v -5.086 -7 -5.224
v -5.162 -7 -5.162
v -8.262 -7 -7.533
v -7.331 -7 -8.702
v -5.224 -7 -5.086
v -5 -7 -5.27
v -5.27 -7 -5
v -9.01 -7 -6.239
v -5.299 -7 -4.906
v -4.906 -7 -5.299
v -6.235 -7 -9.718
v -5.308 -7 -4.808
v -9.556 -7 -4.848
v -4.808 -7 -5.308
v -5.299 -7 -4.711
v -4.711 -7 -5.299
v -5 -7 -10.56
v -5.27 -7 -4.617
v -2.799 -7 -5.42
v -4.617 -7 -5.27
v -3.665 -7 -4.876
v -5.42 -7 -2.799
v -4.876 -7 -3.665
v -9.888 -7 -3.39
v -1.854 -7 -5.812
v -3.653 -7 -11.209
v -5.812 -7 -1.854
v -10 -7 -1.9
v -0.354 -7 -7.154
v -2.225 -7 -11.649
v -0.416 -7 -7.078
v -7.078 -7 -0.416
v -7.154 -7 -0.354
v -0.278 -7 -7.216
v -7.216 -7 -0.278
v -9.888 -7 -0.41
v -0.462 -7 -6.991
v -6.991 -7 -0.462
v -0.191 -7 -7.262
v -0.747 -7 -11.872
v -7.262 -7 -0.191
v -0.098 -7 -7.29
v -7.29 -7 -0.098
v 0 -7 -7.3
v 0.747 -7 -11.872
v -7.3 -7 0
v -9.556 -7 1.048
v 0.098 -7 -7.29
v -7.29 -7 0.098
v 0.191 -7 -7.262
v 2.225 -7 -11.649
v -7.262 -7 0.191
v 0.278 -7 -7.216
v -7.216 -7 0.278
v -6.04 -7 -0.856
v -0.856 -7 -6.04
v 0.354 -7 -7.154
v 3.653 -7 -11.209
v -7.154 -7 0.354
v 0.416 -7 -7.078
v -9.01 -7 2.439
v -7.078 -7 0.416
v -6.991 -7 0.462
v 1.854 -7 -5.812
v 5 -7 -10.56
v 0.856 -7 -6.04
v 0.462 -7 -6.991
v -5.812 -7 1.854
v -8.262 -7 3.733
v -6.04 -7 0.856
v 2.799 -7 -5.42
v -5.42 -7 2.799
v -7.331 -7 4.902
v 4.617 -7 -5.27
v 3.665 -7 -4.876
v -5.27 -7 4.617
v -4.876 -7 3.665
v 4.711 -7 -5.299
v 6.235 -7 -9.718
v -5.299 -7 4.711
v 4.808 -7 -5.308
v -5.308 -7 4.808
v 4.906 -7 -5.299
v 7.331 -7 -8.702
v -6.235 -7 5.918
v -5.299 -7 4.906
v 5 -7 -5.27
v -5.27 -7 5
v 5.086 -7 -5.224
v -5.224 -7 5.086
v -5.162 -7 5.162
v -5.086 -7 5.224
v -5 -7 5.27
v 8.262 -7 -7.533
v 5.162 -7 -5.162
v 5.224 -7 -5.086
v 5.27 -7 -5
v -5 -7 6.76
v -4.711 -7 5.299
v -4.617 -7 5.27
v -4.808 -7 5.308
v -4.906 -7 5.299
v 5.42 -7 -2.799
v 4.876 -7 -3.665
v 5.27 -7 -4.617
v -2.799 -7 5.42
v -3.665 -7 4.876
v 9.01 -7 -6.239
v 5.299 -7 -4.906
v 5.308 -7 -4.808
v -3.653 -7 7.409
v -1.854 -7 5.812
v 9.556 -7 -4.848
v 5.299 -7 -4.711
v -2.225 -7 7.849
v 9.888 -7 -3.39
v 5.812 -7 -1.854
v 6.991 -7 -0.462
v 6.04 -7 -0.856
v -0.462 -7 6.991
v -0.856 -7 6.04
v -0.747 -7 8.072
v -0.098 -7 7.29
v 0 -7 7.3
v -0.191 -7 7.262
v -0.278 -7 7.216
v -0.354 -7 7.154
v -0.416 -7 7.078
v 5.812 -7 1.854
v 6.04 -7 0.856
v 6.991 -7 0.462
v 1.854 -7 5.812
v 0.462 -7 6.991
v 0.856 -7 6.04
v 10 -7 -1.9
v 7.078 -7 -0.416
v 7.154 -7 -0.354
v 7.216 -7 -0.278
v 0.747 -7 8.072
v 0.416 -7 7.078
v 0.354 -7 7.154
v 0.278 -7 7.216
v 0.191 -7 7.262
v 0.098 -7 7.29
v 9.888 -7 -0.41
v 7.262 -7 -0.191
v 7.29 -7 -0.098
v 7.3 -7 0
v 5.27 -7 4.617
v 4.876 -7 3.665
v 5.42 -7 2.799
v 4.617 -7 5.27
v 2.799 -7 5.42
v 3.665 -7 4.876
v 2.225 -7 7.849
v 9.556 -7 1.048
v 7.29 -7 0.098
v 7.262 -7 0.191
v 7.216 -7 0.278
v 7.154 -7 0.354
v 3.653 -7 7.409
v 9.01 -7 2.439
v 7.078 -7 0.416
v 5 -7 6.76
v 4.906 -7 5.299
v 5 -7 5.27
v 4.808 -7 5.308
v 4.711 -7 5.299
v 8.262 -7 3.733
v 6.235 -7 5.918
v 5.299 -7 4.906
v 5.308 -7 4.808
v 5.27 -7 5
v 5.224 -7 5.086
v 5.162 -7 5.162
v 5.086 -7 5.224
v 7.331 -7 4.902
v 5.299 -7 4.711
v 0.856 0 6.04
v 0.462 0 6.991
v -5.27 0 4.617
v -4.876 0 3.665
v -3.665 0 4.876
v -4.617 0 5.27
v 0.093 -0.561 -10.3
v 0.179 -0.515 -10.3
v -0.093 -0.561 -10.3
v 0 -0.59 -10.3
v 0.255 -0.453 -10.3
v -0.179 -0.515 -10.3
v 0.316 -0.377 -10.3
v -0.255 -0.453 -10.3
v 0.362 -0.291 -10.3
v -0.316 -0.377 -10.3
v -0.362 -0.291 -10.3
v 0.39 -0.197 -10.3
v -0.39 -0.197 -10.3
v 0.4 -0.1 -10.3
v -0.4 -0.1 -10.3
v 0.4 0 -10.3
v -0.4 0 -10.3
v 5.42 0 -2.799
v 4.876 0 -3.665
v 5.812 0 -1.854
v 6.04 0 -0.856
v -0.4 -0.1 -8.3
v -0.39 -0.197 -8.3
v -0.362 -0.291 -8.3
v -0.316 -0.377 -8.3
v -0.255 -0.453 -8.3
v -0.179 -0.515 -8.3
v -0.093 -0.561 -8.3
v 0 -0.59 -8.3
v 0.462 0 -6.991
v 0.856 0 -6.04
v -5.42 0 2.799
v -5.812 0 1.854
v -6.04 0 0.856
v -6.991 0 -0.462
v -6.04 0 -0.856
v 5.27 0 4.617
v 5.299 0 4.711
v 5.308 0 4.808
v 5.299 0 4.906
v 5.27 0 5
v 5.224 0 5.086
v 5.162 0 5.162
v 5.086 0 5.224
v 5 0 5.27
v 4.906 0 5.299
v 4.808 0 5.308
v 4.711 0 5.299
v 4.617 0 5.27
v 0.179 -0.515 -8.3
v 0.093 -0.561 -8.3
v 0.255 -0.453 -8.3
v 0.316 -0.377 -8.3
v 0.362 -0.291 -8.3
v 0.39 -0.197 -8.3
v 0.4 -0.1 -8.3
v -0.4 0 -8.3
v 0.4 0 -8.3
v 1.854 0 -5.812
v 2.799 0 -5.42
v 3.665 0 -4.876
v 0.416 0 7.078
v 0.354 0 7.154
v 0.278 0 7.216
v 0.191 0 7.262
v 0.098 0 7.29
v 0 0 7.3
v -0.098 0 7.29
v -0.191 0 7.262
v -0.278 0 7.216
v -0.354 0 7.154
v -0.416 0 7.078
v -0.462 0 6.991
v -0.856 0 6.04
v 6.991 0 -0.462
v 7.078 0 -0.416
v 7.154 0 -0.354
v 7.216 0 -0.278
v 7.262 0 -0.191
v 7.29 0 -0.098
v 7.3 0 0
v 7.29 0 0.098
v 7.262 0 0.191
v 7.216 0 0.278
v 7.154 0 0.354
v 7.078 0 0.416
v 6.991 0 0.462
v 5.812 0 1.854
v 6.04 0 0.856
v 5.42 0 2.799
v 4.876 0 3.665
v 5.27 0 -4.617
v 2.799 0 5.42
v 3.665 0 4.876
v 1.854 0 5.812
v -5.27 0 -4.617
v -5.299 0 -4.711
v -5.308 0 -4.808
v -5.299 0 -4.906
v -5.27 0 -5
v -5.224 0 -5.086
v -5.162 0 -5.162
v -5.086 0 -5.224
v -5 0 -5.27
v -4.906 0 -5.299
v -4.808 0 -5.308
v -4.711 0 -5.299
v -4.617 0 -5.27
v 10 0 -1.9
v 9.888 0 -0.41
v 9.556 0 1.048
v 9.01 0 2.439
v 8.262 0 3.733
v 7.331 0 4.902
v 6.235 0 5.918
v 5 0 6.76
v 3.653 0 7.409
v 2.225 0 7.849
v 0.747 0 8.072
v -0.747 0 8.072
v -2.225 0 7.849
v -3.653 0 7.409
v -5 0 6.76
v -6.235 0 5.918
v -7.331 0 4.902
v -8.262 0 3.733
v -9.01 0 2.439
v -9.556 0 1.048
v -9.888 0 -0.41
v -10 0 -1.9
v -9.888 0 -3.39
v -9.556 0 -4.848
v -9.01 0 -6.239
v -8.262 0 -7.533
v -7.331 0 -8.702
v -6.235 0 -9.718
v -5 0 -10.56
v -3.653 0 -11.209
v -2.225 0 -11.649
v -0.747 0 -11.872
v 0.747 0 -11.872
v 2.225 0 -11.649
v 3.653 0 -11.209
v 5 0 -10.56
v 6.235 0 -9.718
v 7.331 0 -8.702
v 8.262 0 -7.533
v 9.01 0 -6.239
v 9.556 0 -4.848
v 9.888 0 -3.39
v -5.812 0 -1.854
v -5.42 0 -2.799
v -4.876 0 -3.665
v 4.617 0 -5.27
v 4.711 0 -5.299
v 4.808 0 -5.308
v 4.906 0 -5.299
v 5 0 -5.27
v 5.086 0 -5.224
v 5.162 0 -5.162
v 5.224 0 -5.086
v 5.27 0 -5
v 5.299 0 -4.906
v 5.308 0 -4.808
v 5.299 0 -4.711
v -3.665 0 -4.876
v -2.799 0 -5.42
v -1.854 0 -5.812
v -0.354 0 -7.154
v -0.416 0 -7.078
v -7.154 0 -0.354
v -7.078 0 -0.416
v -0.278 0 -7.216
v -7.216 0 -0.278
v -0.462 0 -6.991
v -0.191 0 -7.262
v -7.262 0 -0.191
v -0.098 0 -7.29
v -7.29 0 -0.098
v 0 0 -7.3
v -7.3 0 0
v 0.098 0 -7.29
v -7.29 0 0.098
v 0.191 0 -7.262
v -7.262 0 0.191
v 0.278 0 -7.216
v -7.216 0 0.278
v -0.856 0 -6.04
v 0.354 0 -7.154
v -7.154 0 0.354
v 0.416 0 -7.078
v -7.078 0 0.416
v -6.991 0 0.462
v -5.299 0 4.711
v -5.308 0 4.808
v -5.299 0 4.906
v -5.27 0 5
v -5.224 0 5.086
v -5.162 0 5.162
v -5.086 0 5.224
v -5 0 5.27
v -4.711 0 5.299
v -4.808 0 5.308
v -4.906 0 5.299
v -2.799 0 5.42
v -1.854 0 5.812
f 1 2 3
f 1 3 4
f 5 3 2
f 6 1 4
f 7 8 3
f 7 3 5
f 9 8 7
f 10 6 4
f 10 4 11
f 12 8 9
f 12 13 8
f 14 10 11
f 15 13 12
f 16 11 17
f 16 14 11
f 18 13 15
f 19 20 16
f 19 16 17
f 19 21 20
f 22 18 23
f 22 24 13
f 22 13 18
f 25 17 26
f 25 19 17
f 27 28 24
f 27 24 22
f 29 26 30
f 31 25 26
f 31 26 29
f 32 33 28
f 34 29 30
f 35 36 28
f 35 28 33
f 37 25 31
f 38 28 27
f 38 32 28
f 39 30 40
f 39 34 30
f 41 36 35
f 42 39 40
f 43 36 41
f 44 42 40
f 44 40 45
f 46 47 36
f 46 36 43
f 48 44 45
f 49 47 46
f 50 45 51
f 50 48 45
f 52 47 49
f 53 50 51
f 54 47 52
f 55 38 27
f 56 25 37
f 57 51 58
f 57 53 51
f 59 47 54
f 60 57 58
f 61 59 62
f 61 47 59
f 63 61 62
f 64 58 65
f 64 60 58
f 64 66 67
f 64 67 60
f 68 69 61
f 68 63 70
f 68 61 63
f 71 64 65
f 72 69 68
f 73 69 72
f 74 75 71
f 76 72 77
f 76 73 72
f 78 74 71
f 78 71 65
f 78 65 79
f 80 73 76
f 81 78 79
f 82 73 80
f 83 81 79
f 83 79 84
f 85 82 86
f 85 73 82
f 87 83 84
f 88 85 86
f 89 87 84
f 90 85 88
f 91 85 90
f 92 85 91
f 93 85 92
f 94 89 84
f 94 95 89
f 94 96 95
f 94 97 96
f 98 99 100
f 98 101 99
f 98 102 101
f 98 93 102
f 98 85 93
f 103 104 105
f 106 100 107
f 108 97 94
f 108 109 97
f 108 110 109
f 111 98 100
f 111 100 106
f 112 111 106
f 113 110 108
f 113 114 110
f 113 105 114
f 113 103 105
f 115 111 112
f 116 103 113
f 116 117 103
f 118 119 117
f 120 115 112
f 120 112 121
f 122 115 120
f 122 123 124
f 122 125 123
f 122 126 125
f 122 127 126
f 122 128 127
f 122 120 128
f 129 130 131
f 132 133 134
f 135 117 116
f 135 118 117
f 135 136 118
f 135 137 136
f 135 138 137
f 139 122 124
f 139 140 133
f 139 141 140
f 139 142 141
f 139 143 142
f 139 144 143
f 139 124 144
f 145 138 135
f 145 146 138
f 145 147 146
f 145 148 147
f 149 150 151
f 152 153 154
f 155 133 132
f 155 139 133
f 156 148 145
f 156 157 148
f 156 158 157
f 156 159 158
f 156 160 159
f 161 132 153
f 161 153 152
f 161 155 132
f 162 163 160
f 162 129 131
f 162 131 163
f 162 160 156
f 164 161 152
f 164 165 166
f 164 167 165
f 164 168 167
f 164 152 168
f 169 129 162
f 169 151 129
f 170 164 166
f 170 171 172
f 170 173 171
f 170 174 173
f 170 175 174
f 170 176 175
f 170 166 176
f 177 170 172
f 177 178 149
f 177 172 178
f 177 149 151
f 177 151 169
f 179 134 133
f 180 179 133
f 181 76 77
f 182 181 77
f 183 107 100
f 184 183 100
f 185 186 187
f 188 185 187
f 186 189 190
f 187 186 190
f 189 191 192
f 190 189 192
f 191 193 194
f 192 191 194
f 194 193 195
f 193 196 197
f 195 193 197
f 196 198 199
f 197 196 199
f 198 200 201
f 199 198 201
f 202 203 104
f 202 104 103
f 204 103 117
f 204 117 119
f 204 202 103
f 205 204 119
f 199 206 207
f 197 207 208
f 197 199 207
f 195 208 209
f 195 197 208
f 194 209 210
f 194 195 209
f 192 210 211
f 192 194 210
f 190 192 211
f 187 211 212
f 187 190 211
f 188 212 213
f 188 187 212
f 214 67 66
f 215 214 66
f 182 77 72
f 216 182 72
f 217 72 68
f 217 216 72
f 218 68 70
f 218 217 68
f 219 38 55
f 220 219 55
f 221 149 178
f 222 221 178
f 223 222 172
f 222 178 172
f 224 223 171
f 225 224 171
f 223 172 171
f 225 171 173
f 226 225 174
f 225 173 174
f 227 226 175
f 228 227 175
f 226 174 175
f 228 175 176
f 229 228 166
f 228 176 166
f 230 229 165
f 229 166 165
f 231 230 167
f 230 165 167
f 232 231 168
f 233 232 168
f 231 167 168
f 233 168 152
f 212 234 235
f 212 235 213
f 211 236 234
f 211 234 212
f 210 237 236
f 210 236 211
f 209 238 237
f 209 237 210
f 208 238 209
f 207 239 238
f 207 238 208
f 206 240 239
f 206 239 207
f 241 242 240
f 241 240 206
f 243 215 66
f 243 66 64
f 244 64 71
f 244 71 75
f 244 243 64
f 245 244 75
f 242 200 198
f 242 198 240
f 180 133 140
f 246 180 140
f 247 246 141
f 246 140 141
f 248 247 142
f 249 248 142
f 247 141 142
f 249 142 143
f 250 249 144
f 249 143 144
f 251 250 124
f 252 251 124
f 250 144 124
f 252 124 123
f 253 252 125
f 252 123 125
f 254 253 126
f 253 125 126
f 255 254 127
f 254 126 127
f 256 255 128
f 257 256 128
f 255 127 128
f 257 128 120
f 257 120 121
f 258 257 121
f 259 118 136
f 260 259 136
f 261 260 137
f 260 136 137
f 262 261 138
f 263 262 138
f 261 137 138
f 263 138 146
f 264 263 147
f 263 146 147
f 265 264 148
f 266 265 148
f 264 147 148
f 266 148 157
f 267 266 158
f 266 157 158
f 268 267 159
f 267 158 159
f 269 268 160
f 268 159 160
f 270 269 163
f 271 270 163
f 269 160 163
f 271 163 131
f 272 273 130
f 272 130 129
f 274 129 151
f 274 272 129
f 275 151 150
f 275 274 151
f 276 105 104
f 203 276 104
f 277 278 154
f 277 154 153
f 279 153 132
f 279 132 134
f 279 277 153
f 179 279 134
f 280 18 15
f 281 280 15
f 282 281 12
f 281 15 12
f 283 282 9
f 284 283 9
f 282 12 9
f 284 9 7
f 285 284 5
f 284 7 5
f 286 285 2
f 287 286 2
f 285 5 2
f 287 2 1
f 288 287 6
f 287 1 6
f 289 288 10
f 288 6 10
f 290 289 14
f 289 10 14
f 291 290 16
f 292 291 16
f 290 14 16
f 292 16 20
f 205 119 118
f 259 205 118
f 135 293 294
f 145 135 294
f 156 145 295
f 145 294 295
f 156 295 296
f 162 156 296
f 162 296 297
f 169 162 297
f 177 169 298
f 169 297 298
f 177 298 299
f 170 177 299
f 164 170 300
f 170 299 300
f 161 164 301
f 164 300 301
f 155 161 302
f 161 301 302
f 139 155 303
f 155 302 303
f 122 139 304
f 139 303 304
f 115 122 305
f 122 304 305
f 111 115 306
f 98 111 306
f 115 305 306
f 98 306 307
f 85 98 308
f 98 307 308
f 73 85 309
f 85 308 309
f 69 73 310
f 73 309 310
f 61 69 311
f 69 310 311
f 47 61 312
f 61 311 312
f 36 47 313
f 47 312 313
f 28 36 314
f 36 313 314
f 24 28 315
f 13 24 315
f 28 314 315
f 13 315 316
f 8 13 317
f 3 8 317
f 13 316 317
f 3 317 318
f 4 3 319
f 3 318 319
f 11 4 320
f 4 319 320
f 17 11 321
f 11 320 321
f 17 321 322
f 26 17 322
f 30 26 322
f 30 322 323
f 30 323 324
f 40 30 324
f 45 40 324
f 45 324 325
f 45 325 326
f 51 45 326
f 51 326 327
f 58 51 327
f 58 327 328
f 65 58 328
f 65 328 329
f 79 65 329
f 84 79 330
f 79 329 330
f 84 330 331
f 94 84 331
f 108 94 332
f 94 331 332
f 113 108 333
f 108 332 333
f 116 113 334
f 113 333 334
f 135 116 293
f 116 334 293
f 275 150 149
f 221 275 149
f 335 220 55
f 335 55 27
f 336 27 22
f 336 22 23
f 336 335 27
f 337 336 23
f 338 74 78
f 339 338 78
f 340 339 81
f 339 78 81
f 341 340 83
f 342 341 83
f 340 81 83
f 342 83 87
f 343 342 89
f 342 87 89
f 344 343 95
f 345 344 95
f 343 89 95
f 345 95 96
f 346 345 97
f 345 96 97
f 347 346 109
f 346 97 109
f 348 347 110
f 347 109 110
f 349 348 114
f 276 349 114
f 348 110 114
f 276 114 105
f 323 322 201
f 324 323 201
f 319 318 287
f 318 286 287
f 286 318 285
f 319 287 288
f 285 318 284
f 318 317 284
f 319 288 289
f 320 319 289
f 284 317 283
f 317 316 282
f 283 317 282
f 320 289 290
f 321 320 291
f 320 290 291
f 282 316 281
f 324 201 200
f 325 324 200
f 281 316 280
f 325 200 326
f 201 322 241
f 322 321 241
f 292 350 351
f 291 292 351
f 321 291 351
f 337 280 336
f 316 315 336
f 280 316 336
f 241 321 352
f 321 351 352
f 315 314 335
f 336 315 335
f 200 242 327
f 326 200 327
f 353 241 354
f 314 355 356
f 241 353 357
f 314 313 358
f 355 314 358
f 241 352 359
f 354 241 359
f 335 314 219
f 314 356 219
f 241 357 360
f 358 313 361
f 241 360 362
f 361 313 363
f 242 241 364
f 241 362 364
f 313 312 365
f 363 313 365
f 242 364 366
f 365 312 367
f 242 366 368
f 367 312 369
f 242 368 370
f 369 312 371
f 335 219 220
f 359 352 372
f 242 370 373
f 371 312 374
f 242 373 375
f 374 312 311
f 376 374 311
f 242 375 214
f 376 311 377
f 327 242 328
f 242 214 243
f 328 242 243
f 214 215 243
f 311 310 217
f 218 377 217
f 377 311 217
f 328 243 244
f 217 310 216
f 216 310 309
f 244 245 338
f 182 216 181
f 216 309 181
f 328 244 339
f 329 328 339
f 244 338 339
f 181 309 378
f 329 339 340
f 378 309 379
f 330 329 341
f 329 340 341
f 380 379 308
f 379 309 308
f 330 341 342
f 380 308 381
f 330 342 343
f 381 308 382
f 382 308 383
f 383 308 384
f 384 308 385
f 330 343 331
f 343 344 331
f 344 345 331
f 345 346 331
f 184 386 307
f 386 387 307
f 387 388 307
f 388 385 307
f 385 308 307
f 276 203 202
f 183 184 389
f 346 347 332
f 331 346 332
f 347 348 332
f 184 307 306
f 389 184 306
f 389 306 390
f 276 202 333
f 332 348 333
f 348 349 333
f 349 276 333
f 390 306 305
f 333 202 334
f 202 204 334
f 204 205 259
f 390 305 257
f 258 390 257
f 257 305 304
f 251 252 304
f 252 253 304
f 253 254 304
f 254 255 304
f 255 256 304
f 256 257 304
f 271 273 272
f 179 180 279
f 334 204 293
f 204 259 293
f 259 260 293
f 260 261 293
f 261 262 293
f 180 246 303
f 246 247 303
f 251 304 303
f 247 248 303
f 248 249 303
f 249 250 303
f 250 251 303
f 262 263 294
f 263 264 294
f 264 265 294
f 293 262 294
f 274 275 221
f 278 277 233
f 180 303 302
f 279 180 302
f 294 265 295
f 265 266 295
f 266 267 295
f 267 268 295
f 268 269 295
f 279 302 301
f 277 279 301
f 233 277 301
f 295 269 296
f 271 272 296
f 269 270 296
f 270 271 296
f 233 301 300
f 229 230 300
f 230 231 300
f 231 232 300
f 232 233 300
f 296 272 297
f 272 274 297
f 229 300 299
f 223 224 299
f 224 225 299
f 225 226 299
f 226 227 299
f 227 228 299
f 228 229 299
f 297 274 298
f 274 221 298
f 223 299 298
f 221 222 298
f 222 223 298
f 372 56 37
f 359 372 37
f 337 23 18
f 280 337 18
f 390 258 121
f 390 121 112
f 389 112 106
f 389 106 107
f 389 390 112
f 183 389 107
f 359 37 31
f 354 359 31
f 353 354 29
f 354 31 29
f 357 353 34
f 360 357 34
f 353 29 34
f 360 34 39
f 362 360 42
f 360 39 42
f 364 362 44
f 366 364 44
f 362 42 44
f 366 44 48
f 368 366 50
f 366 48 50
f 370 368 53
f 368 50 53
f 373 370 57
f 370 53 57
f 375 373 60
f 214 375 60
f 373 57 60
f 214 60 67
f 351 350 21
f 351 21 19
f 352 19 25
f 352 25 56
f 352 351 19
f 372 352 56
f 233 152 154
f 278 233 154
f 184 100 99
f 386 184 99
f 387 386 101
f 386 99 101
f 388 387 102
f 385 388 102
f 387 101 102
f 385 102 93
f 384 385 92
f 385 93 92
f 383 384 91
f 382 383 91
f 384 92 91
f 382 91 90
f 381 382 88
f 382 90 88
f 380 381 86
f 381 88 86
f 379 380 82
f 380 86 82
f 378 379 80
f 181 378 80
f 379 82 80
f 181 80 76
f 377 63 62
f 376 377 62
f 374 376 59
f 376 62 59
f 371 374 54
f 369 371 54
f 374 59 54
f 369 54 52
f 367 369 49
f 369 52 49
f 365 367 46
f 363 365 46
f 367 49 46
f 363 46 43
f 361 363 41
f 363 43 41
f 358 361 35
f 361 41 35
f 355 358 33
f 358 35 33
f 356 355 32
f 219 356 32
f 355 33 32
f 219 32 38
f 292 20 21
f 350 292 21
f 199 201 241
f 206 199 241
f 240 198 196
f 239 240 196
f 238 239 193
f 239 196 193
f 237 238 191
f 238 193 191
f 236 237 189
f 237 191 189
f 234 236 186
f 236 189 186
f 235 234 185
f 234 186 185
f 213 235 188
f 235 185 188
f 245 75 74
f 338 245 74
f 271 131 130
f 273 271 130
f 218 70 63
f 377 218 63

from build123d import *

# Parameters (mm, degrees)
F0_R            = 10
F0_R_2          = 6.1
F1_DEPTH        = 7
F3_DEPTH        = 7
F3_COPIES_COUNT = 8
F4_W            = 0.8
F4_H            = 2
F5_DEPTH        = 0.6
F6_T1_DEPTH     = 3.25


# Not quite as in the source:
# - a fillet or chamfer that OpenCascade refuses, or shapes differently, is made with other operations: its cross-section is extruded or revolved along the edge and cut away or added
# - a pattern or mirror of a feature is missing from the dataset's text; its kind, count and spacing are read off the source's solid


with BuildPart() as f1:
    # F0 (on Front) → F1 (new body)
    with BuildSketch(Plane.XZ):
        with Locations((0, -1.9)):
            Circle(F0_R)
        Circle(F0_R_2, mode=Mode.SUBTRACT)
    extrude(amount=F1_DEPTH)

    # F2 (on face) → F3 (cut)
    with BuildSketch(Plane.XZ.offset(7)):
        with BuildLine():
            Line((6.9913417162, 0.4619397663), (6.0396188995, 0.8561562646))
            ThreePointArc((6.0396188995, 0.8561562646), (6.0848860008, 0.429141418), (6.1, 0))
            ThreePointArc((6.1, 0), (6.0848860008, -0.429141418), (6.0396188995, -0.8561562646))
            Line((6.0396188995, -0.8561562646), (6.9913417162, -0.4619397663))
            ThreePointArc((6.9913417162, -0.4619397663), (7.3, 0), (6.9913417162, 0.4619397663))
        make_face()
    f3 = extrude(amount=-F3_DEPTH, mode=Mode.SUBTRACT)

    # F3_copies: F3 ×8 about axis
    f3_copies_axis = Axis((0, 0, 0), (0, 1, 0))
    for i in range(1, F3_COPIES_COUNT):
        add(f3.rotate(f3_copies_axis, i * 360 / F3_COPIES_COUNT), mode=Mode.SUBTRACT)

    # F4 (on face) → F5 (cut)
    with BuildSketch(Plane(origin=(0, 0, 0), x_dir=(-1, 0, 0), z_dir=(0, 1, 0))):
        with Locations((0, -9.3)):
            Rectangle(F4_W, F4_H)
    extrude(amount=-F5_DEPTH, mode=Mode.SUBTRACT)

    # F6: fillet of radius 0.5 on 2 edges, made by hand

    # F6_s2 → F6_t1 (join)
    with BuildSketch(Plane.XY.offset(-11.55)):
        with BuildLine():
            ThreePointArc((0.4, -0.1), (0.2535533906, -0.4535533906), (-0.1, -0.6))
            Line((-0.1, -0.6), (0.4, -0.6))
            Line((0.4, -0.6), (0.4, -0.1))
        make_face()
        with BuildLine():
            ThreePointArc((-0.4, -0.1), (-0.2535533906, -0.4535533906), (0.1, -0.6))
            Line((0.1, -0.6), (-0.4, -0.6))
            Line((-0.4, -0.6), (-0.4, -0.1))
        make_face()
    extrude(amount=F6_T1_DEPTH)


solid = f1.part
